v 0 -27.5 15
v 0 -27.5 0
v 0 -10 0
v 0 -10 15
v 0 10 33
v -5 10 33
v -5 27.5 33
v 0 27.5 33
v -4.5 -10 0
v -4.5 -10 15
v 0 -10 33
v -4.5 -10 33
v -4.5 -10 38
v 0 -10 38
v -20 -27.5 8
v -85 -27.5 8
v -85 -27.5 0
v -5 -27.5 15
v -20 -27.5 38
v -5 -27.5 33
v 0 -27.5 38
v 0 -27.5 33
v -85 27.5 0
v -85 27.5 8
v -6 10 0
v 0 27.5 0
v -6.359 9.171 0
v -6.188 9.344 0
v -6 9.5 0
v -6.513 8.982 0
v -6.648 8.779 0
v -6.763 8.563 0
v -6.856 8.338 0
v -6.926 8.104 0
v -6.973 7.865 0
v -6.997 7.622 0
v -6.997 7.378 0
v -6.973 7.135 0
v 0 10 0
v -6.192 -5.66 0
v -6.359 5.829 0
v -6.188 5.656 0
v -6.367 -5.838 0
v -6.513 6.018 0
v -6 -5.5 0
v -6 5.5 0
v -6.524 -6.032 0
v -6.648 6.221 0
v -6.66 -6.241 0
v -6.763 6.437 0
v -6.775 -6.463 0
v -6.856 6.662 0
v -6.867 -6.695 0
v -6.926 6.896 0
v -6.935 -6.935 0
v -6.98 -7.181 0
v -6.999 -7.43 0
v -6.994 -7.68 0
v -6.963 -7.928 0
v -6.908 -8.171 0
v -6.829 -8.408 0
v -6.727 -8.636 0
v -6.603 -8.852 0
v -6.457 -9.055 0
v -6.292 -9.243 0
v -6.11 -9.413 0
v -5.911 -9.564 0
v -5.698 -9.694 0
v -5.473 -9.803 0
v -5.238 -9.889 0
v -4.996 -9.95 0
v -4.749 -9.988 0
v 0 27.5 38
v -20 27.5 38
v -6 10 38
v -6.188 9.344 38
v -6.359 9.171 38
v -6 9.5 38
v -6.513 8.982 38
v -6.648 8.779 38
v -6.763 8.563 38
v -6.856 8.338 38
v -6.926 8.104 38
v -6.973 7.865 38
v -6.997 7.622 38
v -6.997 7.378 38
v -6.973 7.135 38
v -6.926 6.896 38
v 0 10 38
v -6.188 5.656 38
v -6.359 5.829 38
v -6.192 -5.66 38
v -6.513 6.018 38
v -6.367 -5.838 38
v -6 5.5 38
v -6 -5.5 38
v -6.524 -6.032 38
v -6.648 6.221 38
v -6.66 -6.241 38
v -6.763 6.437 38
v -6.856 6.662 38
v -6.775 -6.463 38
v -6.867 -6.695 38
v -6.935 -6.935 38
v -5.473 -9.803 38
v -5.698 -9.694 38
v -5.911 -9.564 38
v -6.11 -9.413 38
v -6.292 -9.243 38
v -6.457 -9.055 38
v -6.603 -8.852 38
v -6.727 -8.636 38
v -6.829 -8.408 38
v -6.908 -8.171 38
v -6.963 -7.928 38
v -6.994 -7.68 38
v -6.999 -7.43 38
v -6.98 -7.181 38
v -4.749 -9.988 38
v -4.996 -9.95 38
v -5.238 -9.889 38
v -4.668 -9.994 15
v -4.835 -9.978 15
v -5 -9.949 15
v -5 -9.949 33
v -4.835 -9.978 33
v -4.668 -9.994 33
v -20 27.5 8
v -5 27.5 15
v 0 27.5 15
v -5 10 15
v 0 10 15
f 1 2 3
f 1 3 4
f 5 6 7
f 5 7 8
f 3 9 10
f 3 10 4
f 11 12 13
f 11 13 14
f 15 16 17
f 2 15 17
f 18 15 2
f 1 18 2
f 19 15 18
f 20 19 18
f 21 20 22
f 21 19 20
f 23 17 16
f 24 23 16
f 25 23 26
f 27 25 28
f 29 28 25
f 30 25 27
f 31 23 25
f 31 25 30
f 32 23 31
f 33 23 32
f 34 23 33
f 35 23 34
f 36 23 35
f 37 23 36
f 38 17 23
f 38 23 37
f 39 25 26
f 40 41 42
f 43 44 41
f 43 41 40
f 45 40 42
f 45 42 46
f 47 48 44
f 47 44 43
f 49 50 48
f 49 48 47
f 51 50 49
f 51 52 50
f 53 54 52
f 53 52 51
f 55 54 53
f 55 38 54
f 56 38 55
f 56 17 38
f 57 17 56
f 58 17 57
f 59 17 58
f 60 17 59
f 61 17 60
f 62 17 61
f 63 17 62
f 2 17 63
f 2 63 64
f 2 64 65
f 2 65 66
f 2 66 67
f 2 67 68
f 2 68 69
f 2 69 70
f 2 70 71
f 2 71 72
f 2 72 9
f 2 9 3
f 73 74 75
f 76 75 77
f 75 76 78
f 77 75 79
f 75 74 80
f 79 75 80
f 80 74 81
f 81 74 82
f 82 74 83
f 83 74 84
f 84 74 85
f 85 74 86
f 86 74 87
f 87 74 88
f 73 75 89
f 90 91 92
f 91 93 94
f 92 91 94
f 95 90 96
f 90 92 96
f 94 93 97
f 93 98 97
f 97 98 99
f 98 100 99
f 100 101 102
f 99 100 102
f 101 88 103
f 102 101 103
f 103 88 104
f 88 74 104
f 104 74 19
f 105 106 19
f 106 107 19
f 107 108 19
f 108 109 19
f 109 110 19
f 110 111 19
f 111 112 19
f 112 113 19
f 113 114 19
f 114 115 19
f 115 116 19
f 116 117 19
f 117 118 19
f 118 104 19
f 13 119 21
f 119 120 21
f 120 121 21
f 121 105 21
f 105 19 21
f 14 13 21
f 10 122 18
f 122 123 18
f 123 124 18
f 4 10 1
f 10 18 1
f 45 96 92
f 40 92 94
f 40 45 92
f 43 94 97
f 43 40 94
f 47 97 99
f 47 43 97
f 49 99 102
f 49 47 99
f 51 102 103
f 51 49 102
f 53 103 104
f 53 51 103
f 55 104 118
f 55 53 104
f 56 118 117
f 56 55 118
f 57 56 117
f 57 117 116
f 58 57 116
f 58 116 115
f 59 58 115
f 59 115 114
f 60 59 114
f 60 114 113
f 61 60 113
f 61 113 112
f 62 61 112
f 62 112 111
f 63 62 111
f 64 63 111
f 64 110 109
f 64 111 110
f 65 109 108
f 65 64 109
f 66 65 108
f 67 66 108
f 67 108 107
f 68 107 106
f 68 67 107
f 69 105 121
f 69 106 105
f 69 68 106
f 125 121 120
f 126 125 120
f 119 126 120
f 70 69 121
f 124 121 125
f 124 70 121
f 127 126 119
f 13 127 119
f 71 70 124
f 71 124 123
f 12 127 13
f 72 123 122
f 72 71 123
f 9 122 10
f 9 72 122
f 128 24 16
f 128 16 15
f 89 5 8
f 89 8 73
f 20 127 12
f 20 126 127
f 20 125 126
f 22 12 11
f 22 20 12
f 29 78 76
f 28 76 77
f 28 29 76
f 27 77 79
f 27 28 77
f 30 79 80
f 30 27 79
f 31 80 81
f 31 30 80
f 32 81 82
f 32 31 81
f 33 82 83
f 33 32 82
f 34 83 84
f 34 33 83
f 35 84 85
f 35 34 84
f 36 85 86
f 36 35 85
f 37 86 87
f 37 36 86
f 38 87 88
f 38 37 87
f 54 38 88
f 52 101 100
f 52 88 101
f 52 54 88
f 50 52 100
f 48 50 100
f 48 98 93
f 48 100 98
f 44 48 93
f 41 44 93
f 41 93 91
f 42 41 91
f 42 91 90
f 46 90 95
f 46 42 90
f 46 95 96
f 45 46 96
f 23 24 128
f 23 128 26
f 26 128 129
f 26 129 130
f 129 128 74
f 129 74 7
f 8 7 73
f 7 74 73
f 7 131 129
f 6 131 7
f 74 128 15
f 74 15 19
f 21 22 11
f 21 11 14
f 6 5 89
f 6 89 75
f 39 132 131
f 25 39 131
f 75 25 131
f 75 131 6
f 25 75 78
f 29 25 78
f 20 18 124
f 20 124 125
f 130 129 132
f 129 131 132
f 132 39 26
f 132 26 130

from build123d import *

# Parameters (mm, degrees)
F0_W          = 85
F0_H          = 38
F1_DEPTH      = 27.5
F2_W          = 65
F2_H          = 30
F3_DEPTH      = 27.501
F3_DEPTH_BACK = 27.501
F4_W          = 5
F4_H          = 18
F5_DEPTH      = 27.501
F5_DEPTH_BACK = 27.501
F7_DEPTH      = 38.001


with BuildPart() as f1:
    # F0 (on Front) → F1 (new body, symmetric)
    with BuildSketch(Plane.XZ):
        with Locations((-42.5, 19)):
            Rectangle(F0_W, F0_H)
    extrude(amount=F1_DEPTH, both=True)

    # F2 (on Front) → F3 (cut, two sides)
    with BuildSketch(Plane.XZ) as f3_sk:
        with Locations((-52.5, 23)):
            Rectangle(F2_W, F2_H)
    extrude(amount=-F3_DEPTH, mode=Mode.SUBTRACT)
    extrude(f3_sk.sketch, amount=F3_DEPTH_BACK, mode=Mode.SUBTRACT)

    # F4 (on Front) → F5 (cut, two sides)
    with BuildSketch(Plane.XZ) as f5_sk:
        with Locations((-2.5, 24)):
            Rectangle(F4_W, F4_H)
    extrude(amount=F5_DEPTH, mode=Mode.SUBTRACT)
    extrude(f5_sk.sketch, amount=-F5_DEPTH_BACK, mode=Mode.SUBTRACT)

    # F6 (on Top) → F7 (cut, through all)
    with BuildSketch(Plane.XY):
        with BuildLine():
            Line((-4.5, 10), (-6, 10))
            Line((-6, 10), (-6, 9.5))
            ThreePointArc((-6, 9.5), (-5.290569415, 9.8717082451), (-4.5, 10))
        make_face()
        with BuildLine():
            Line((4.5, 10), (-4.5, 10))
            ThreePointArc((-4.5, 10), (-5.290569415, 9.8717082451), (-6, 9.5))
            Line((-6, 9.5), (-6, 5.5))
            ThreePointArc((-6, 5.5), (-5.290569415, 5.1282917549), (-4.5, 5))
            Line((-4.5, 5), (4.5, 5))
            ThreePointArc((4.5, 5), (5.290569415, 5.1282917549), (6, 5.5))
            Line((6, 5.5), (6, 9.5))
            ThreePointArc((6, 9.5), (5.290569415, 9.8717082451), (4.5, 10))
        make_face()
        with BuildLine():
            Line((-6, 5.5), (-6, 9.5))
            ThreePointArc((-6, 9.5), (-7, 7.5), (-6, 5.5))
        make_face()
        with BuildLine():
            Line((6, 10), (4.5, 10))
            ThreePointArc((4.5, 10), (5.290569415, 9.8717082451), (6, 9.5))
            Line((6, 9.5), (6, 10))
        make_face()
        with BuildLine():
            ThreePointArc((-4.5, 5), (-5.290569415, 5.1282917549), (-6, 5.5))
            Line((-6, 5.5), (-6, -5.5))
            ThreePointArc((-6, -5.5), (-6.8717082451, -8.290569415), (-4.5, -10))
            Line((-4.5, -10), (4.5, -10))
            ThreePointArc((4.5, -10), (6.8717082451, -8.290569415), (6, -5.5))
            Line((6, -5.5), (6, 5.5))
            ThreePointArc((6, 5.5), (5.290569415, 5.1282917549), (4.5, 5))
            Line((4.5, 5), (-4.5, 5))
        make_face()
        with BuildLine():
            ThreePointArc((6, 5.5), (7, 7.5), (6, 9.5))
            Line((6, 9.5), (6, 5.5))
        make_face()
    extrude(amount=F7_DEPTH, mode=Mode.SUBTRACT)


solid = f1.part
